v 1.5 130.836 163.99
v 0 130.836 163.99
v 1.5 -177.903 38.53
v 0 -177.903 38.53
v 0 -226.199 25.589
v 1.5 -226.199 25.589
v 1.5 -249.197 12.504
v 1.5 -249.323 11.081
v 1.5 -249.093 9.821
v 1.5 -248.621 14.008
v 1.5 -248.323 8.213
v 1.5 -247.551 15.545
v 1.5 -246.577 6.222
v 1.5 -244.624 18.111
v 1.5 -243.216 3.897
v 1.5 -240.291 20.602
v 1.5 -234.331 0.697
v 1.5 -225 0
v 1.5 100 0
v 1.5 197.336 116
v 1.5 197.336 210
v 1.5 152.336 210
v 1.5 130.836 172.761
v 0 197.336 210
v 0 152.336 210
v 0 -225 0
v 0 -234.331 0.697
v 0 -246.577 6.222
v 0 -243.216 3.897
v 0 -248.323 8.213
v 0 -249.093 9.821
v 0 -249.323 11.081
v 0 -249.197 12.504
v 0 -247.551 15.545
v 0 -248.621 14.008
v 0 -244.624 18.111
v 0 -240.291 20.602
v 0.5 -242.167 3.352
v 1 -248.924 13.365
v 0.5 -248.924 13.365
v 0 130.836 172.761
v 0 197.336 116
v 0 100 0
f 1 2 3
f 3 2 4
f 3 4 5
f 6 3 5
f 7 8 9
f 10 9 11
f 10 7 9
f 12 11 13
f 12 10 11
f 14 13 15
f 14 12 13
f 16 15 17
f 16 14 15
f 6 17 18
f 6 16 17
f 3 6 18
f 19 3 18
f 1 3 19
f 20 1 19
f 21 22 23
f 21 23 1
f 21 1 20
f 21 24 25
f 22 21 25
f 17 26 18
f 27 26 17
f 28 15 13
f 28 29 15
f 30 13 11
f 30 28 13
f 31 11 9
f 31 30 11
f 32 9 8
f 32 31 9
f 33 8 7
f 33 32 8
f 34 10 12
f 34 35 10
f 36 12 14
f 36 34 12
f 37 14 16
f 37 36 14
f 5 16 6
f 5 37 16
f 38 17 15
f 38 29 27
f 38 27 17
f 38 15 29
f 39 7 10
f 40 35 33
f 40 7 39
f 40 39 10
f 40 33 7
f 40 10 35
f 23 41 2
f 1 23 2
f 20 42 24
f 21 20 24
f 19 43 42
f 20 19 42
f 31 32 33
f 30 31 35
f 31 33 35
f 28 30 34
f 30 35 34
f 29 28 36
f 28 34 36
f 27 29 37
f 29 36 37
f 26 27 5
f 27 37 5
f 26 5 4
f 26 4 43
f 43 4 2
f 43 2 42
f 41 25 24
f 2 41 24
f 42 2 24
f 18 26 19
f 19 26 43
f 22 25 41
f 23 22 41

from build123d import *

# Parameters (mm, degrees)
PAD_DEPTH    = 1.5
PAD002_DEPTH = 1.5


with BuildPart() as part:
    # Sketch → Pad (new body)
    with BuildSketch(Plane.YZ):
        with BuildLine():
            Line((130.835557, 163.892767), (34.582098, 103.74693))
            Line((34.582098, 103.74693), (34.582098, 95.464721))
            Line((34.582098, 95.464721), (-226.199079, 25.588615))
            add(Edge.make_bspline(
                [(-225, 0), (-241.014422, -1.461855), (-270.021739, 13.743032), (-226.199079, 25.588615)],
                knots=[0, 0, 0, 0, 1, 1, 1, 1], degree=3))
            Line((-225, 0), (100, 0))
            Line((100, 0), (197.335557, 116))
            Line((197.335557, 116), (197.335557, 210))
            Line((197.335557, 210), (152.335557, 210))
            Line((152.335557, 210), (130.835557, 172.760908))
            Line((130.835557, 172.760908), (130.835557, 163.892767))
        make_face()
    extrude(amount=PAD_DEPTH)

    # CopySketch003 → Pad002 (join)
    with BuildSketch(Plane.YZ):
        with BuildLine():
            Line((130.835557, 163.989908), (-177.902788, 38.529567))
            Line((-177.902788, 38.529567), (-226.199079, 25.588615))
            add(Edge.make_bspline(
                [(-225, 0), (-241.014422, -1.461855), (-270.021739, 13.743032), (-226.199079, 25.588615)],
                knots=[0, 0, 0, 0, 1, 1, 1, 1], degree=3))
            Line((-225, 0), (100, 0))
            Line((100, 0), (197.335557, 116))
            Line((197.335557, 116), (197.335557, 210))
            Line((197.335557, 210), (152.335557, 210))
            Line((152.335557, 210), (130.835557, 172.760908))
            Line((130.835557, 172.760908), (130.835557, 163.989908))
        make_face()
    extrude(amount=PAD002_DEPTH)


solid = part.part
